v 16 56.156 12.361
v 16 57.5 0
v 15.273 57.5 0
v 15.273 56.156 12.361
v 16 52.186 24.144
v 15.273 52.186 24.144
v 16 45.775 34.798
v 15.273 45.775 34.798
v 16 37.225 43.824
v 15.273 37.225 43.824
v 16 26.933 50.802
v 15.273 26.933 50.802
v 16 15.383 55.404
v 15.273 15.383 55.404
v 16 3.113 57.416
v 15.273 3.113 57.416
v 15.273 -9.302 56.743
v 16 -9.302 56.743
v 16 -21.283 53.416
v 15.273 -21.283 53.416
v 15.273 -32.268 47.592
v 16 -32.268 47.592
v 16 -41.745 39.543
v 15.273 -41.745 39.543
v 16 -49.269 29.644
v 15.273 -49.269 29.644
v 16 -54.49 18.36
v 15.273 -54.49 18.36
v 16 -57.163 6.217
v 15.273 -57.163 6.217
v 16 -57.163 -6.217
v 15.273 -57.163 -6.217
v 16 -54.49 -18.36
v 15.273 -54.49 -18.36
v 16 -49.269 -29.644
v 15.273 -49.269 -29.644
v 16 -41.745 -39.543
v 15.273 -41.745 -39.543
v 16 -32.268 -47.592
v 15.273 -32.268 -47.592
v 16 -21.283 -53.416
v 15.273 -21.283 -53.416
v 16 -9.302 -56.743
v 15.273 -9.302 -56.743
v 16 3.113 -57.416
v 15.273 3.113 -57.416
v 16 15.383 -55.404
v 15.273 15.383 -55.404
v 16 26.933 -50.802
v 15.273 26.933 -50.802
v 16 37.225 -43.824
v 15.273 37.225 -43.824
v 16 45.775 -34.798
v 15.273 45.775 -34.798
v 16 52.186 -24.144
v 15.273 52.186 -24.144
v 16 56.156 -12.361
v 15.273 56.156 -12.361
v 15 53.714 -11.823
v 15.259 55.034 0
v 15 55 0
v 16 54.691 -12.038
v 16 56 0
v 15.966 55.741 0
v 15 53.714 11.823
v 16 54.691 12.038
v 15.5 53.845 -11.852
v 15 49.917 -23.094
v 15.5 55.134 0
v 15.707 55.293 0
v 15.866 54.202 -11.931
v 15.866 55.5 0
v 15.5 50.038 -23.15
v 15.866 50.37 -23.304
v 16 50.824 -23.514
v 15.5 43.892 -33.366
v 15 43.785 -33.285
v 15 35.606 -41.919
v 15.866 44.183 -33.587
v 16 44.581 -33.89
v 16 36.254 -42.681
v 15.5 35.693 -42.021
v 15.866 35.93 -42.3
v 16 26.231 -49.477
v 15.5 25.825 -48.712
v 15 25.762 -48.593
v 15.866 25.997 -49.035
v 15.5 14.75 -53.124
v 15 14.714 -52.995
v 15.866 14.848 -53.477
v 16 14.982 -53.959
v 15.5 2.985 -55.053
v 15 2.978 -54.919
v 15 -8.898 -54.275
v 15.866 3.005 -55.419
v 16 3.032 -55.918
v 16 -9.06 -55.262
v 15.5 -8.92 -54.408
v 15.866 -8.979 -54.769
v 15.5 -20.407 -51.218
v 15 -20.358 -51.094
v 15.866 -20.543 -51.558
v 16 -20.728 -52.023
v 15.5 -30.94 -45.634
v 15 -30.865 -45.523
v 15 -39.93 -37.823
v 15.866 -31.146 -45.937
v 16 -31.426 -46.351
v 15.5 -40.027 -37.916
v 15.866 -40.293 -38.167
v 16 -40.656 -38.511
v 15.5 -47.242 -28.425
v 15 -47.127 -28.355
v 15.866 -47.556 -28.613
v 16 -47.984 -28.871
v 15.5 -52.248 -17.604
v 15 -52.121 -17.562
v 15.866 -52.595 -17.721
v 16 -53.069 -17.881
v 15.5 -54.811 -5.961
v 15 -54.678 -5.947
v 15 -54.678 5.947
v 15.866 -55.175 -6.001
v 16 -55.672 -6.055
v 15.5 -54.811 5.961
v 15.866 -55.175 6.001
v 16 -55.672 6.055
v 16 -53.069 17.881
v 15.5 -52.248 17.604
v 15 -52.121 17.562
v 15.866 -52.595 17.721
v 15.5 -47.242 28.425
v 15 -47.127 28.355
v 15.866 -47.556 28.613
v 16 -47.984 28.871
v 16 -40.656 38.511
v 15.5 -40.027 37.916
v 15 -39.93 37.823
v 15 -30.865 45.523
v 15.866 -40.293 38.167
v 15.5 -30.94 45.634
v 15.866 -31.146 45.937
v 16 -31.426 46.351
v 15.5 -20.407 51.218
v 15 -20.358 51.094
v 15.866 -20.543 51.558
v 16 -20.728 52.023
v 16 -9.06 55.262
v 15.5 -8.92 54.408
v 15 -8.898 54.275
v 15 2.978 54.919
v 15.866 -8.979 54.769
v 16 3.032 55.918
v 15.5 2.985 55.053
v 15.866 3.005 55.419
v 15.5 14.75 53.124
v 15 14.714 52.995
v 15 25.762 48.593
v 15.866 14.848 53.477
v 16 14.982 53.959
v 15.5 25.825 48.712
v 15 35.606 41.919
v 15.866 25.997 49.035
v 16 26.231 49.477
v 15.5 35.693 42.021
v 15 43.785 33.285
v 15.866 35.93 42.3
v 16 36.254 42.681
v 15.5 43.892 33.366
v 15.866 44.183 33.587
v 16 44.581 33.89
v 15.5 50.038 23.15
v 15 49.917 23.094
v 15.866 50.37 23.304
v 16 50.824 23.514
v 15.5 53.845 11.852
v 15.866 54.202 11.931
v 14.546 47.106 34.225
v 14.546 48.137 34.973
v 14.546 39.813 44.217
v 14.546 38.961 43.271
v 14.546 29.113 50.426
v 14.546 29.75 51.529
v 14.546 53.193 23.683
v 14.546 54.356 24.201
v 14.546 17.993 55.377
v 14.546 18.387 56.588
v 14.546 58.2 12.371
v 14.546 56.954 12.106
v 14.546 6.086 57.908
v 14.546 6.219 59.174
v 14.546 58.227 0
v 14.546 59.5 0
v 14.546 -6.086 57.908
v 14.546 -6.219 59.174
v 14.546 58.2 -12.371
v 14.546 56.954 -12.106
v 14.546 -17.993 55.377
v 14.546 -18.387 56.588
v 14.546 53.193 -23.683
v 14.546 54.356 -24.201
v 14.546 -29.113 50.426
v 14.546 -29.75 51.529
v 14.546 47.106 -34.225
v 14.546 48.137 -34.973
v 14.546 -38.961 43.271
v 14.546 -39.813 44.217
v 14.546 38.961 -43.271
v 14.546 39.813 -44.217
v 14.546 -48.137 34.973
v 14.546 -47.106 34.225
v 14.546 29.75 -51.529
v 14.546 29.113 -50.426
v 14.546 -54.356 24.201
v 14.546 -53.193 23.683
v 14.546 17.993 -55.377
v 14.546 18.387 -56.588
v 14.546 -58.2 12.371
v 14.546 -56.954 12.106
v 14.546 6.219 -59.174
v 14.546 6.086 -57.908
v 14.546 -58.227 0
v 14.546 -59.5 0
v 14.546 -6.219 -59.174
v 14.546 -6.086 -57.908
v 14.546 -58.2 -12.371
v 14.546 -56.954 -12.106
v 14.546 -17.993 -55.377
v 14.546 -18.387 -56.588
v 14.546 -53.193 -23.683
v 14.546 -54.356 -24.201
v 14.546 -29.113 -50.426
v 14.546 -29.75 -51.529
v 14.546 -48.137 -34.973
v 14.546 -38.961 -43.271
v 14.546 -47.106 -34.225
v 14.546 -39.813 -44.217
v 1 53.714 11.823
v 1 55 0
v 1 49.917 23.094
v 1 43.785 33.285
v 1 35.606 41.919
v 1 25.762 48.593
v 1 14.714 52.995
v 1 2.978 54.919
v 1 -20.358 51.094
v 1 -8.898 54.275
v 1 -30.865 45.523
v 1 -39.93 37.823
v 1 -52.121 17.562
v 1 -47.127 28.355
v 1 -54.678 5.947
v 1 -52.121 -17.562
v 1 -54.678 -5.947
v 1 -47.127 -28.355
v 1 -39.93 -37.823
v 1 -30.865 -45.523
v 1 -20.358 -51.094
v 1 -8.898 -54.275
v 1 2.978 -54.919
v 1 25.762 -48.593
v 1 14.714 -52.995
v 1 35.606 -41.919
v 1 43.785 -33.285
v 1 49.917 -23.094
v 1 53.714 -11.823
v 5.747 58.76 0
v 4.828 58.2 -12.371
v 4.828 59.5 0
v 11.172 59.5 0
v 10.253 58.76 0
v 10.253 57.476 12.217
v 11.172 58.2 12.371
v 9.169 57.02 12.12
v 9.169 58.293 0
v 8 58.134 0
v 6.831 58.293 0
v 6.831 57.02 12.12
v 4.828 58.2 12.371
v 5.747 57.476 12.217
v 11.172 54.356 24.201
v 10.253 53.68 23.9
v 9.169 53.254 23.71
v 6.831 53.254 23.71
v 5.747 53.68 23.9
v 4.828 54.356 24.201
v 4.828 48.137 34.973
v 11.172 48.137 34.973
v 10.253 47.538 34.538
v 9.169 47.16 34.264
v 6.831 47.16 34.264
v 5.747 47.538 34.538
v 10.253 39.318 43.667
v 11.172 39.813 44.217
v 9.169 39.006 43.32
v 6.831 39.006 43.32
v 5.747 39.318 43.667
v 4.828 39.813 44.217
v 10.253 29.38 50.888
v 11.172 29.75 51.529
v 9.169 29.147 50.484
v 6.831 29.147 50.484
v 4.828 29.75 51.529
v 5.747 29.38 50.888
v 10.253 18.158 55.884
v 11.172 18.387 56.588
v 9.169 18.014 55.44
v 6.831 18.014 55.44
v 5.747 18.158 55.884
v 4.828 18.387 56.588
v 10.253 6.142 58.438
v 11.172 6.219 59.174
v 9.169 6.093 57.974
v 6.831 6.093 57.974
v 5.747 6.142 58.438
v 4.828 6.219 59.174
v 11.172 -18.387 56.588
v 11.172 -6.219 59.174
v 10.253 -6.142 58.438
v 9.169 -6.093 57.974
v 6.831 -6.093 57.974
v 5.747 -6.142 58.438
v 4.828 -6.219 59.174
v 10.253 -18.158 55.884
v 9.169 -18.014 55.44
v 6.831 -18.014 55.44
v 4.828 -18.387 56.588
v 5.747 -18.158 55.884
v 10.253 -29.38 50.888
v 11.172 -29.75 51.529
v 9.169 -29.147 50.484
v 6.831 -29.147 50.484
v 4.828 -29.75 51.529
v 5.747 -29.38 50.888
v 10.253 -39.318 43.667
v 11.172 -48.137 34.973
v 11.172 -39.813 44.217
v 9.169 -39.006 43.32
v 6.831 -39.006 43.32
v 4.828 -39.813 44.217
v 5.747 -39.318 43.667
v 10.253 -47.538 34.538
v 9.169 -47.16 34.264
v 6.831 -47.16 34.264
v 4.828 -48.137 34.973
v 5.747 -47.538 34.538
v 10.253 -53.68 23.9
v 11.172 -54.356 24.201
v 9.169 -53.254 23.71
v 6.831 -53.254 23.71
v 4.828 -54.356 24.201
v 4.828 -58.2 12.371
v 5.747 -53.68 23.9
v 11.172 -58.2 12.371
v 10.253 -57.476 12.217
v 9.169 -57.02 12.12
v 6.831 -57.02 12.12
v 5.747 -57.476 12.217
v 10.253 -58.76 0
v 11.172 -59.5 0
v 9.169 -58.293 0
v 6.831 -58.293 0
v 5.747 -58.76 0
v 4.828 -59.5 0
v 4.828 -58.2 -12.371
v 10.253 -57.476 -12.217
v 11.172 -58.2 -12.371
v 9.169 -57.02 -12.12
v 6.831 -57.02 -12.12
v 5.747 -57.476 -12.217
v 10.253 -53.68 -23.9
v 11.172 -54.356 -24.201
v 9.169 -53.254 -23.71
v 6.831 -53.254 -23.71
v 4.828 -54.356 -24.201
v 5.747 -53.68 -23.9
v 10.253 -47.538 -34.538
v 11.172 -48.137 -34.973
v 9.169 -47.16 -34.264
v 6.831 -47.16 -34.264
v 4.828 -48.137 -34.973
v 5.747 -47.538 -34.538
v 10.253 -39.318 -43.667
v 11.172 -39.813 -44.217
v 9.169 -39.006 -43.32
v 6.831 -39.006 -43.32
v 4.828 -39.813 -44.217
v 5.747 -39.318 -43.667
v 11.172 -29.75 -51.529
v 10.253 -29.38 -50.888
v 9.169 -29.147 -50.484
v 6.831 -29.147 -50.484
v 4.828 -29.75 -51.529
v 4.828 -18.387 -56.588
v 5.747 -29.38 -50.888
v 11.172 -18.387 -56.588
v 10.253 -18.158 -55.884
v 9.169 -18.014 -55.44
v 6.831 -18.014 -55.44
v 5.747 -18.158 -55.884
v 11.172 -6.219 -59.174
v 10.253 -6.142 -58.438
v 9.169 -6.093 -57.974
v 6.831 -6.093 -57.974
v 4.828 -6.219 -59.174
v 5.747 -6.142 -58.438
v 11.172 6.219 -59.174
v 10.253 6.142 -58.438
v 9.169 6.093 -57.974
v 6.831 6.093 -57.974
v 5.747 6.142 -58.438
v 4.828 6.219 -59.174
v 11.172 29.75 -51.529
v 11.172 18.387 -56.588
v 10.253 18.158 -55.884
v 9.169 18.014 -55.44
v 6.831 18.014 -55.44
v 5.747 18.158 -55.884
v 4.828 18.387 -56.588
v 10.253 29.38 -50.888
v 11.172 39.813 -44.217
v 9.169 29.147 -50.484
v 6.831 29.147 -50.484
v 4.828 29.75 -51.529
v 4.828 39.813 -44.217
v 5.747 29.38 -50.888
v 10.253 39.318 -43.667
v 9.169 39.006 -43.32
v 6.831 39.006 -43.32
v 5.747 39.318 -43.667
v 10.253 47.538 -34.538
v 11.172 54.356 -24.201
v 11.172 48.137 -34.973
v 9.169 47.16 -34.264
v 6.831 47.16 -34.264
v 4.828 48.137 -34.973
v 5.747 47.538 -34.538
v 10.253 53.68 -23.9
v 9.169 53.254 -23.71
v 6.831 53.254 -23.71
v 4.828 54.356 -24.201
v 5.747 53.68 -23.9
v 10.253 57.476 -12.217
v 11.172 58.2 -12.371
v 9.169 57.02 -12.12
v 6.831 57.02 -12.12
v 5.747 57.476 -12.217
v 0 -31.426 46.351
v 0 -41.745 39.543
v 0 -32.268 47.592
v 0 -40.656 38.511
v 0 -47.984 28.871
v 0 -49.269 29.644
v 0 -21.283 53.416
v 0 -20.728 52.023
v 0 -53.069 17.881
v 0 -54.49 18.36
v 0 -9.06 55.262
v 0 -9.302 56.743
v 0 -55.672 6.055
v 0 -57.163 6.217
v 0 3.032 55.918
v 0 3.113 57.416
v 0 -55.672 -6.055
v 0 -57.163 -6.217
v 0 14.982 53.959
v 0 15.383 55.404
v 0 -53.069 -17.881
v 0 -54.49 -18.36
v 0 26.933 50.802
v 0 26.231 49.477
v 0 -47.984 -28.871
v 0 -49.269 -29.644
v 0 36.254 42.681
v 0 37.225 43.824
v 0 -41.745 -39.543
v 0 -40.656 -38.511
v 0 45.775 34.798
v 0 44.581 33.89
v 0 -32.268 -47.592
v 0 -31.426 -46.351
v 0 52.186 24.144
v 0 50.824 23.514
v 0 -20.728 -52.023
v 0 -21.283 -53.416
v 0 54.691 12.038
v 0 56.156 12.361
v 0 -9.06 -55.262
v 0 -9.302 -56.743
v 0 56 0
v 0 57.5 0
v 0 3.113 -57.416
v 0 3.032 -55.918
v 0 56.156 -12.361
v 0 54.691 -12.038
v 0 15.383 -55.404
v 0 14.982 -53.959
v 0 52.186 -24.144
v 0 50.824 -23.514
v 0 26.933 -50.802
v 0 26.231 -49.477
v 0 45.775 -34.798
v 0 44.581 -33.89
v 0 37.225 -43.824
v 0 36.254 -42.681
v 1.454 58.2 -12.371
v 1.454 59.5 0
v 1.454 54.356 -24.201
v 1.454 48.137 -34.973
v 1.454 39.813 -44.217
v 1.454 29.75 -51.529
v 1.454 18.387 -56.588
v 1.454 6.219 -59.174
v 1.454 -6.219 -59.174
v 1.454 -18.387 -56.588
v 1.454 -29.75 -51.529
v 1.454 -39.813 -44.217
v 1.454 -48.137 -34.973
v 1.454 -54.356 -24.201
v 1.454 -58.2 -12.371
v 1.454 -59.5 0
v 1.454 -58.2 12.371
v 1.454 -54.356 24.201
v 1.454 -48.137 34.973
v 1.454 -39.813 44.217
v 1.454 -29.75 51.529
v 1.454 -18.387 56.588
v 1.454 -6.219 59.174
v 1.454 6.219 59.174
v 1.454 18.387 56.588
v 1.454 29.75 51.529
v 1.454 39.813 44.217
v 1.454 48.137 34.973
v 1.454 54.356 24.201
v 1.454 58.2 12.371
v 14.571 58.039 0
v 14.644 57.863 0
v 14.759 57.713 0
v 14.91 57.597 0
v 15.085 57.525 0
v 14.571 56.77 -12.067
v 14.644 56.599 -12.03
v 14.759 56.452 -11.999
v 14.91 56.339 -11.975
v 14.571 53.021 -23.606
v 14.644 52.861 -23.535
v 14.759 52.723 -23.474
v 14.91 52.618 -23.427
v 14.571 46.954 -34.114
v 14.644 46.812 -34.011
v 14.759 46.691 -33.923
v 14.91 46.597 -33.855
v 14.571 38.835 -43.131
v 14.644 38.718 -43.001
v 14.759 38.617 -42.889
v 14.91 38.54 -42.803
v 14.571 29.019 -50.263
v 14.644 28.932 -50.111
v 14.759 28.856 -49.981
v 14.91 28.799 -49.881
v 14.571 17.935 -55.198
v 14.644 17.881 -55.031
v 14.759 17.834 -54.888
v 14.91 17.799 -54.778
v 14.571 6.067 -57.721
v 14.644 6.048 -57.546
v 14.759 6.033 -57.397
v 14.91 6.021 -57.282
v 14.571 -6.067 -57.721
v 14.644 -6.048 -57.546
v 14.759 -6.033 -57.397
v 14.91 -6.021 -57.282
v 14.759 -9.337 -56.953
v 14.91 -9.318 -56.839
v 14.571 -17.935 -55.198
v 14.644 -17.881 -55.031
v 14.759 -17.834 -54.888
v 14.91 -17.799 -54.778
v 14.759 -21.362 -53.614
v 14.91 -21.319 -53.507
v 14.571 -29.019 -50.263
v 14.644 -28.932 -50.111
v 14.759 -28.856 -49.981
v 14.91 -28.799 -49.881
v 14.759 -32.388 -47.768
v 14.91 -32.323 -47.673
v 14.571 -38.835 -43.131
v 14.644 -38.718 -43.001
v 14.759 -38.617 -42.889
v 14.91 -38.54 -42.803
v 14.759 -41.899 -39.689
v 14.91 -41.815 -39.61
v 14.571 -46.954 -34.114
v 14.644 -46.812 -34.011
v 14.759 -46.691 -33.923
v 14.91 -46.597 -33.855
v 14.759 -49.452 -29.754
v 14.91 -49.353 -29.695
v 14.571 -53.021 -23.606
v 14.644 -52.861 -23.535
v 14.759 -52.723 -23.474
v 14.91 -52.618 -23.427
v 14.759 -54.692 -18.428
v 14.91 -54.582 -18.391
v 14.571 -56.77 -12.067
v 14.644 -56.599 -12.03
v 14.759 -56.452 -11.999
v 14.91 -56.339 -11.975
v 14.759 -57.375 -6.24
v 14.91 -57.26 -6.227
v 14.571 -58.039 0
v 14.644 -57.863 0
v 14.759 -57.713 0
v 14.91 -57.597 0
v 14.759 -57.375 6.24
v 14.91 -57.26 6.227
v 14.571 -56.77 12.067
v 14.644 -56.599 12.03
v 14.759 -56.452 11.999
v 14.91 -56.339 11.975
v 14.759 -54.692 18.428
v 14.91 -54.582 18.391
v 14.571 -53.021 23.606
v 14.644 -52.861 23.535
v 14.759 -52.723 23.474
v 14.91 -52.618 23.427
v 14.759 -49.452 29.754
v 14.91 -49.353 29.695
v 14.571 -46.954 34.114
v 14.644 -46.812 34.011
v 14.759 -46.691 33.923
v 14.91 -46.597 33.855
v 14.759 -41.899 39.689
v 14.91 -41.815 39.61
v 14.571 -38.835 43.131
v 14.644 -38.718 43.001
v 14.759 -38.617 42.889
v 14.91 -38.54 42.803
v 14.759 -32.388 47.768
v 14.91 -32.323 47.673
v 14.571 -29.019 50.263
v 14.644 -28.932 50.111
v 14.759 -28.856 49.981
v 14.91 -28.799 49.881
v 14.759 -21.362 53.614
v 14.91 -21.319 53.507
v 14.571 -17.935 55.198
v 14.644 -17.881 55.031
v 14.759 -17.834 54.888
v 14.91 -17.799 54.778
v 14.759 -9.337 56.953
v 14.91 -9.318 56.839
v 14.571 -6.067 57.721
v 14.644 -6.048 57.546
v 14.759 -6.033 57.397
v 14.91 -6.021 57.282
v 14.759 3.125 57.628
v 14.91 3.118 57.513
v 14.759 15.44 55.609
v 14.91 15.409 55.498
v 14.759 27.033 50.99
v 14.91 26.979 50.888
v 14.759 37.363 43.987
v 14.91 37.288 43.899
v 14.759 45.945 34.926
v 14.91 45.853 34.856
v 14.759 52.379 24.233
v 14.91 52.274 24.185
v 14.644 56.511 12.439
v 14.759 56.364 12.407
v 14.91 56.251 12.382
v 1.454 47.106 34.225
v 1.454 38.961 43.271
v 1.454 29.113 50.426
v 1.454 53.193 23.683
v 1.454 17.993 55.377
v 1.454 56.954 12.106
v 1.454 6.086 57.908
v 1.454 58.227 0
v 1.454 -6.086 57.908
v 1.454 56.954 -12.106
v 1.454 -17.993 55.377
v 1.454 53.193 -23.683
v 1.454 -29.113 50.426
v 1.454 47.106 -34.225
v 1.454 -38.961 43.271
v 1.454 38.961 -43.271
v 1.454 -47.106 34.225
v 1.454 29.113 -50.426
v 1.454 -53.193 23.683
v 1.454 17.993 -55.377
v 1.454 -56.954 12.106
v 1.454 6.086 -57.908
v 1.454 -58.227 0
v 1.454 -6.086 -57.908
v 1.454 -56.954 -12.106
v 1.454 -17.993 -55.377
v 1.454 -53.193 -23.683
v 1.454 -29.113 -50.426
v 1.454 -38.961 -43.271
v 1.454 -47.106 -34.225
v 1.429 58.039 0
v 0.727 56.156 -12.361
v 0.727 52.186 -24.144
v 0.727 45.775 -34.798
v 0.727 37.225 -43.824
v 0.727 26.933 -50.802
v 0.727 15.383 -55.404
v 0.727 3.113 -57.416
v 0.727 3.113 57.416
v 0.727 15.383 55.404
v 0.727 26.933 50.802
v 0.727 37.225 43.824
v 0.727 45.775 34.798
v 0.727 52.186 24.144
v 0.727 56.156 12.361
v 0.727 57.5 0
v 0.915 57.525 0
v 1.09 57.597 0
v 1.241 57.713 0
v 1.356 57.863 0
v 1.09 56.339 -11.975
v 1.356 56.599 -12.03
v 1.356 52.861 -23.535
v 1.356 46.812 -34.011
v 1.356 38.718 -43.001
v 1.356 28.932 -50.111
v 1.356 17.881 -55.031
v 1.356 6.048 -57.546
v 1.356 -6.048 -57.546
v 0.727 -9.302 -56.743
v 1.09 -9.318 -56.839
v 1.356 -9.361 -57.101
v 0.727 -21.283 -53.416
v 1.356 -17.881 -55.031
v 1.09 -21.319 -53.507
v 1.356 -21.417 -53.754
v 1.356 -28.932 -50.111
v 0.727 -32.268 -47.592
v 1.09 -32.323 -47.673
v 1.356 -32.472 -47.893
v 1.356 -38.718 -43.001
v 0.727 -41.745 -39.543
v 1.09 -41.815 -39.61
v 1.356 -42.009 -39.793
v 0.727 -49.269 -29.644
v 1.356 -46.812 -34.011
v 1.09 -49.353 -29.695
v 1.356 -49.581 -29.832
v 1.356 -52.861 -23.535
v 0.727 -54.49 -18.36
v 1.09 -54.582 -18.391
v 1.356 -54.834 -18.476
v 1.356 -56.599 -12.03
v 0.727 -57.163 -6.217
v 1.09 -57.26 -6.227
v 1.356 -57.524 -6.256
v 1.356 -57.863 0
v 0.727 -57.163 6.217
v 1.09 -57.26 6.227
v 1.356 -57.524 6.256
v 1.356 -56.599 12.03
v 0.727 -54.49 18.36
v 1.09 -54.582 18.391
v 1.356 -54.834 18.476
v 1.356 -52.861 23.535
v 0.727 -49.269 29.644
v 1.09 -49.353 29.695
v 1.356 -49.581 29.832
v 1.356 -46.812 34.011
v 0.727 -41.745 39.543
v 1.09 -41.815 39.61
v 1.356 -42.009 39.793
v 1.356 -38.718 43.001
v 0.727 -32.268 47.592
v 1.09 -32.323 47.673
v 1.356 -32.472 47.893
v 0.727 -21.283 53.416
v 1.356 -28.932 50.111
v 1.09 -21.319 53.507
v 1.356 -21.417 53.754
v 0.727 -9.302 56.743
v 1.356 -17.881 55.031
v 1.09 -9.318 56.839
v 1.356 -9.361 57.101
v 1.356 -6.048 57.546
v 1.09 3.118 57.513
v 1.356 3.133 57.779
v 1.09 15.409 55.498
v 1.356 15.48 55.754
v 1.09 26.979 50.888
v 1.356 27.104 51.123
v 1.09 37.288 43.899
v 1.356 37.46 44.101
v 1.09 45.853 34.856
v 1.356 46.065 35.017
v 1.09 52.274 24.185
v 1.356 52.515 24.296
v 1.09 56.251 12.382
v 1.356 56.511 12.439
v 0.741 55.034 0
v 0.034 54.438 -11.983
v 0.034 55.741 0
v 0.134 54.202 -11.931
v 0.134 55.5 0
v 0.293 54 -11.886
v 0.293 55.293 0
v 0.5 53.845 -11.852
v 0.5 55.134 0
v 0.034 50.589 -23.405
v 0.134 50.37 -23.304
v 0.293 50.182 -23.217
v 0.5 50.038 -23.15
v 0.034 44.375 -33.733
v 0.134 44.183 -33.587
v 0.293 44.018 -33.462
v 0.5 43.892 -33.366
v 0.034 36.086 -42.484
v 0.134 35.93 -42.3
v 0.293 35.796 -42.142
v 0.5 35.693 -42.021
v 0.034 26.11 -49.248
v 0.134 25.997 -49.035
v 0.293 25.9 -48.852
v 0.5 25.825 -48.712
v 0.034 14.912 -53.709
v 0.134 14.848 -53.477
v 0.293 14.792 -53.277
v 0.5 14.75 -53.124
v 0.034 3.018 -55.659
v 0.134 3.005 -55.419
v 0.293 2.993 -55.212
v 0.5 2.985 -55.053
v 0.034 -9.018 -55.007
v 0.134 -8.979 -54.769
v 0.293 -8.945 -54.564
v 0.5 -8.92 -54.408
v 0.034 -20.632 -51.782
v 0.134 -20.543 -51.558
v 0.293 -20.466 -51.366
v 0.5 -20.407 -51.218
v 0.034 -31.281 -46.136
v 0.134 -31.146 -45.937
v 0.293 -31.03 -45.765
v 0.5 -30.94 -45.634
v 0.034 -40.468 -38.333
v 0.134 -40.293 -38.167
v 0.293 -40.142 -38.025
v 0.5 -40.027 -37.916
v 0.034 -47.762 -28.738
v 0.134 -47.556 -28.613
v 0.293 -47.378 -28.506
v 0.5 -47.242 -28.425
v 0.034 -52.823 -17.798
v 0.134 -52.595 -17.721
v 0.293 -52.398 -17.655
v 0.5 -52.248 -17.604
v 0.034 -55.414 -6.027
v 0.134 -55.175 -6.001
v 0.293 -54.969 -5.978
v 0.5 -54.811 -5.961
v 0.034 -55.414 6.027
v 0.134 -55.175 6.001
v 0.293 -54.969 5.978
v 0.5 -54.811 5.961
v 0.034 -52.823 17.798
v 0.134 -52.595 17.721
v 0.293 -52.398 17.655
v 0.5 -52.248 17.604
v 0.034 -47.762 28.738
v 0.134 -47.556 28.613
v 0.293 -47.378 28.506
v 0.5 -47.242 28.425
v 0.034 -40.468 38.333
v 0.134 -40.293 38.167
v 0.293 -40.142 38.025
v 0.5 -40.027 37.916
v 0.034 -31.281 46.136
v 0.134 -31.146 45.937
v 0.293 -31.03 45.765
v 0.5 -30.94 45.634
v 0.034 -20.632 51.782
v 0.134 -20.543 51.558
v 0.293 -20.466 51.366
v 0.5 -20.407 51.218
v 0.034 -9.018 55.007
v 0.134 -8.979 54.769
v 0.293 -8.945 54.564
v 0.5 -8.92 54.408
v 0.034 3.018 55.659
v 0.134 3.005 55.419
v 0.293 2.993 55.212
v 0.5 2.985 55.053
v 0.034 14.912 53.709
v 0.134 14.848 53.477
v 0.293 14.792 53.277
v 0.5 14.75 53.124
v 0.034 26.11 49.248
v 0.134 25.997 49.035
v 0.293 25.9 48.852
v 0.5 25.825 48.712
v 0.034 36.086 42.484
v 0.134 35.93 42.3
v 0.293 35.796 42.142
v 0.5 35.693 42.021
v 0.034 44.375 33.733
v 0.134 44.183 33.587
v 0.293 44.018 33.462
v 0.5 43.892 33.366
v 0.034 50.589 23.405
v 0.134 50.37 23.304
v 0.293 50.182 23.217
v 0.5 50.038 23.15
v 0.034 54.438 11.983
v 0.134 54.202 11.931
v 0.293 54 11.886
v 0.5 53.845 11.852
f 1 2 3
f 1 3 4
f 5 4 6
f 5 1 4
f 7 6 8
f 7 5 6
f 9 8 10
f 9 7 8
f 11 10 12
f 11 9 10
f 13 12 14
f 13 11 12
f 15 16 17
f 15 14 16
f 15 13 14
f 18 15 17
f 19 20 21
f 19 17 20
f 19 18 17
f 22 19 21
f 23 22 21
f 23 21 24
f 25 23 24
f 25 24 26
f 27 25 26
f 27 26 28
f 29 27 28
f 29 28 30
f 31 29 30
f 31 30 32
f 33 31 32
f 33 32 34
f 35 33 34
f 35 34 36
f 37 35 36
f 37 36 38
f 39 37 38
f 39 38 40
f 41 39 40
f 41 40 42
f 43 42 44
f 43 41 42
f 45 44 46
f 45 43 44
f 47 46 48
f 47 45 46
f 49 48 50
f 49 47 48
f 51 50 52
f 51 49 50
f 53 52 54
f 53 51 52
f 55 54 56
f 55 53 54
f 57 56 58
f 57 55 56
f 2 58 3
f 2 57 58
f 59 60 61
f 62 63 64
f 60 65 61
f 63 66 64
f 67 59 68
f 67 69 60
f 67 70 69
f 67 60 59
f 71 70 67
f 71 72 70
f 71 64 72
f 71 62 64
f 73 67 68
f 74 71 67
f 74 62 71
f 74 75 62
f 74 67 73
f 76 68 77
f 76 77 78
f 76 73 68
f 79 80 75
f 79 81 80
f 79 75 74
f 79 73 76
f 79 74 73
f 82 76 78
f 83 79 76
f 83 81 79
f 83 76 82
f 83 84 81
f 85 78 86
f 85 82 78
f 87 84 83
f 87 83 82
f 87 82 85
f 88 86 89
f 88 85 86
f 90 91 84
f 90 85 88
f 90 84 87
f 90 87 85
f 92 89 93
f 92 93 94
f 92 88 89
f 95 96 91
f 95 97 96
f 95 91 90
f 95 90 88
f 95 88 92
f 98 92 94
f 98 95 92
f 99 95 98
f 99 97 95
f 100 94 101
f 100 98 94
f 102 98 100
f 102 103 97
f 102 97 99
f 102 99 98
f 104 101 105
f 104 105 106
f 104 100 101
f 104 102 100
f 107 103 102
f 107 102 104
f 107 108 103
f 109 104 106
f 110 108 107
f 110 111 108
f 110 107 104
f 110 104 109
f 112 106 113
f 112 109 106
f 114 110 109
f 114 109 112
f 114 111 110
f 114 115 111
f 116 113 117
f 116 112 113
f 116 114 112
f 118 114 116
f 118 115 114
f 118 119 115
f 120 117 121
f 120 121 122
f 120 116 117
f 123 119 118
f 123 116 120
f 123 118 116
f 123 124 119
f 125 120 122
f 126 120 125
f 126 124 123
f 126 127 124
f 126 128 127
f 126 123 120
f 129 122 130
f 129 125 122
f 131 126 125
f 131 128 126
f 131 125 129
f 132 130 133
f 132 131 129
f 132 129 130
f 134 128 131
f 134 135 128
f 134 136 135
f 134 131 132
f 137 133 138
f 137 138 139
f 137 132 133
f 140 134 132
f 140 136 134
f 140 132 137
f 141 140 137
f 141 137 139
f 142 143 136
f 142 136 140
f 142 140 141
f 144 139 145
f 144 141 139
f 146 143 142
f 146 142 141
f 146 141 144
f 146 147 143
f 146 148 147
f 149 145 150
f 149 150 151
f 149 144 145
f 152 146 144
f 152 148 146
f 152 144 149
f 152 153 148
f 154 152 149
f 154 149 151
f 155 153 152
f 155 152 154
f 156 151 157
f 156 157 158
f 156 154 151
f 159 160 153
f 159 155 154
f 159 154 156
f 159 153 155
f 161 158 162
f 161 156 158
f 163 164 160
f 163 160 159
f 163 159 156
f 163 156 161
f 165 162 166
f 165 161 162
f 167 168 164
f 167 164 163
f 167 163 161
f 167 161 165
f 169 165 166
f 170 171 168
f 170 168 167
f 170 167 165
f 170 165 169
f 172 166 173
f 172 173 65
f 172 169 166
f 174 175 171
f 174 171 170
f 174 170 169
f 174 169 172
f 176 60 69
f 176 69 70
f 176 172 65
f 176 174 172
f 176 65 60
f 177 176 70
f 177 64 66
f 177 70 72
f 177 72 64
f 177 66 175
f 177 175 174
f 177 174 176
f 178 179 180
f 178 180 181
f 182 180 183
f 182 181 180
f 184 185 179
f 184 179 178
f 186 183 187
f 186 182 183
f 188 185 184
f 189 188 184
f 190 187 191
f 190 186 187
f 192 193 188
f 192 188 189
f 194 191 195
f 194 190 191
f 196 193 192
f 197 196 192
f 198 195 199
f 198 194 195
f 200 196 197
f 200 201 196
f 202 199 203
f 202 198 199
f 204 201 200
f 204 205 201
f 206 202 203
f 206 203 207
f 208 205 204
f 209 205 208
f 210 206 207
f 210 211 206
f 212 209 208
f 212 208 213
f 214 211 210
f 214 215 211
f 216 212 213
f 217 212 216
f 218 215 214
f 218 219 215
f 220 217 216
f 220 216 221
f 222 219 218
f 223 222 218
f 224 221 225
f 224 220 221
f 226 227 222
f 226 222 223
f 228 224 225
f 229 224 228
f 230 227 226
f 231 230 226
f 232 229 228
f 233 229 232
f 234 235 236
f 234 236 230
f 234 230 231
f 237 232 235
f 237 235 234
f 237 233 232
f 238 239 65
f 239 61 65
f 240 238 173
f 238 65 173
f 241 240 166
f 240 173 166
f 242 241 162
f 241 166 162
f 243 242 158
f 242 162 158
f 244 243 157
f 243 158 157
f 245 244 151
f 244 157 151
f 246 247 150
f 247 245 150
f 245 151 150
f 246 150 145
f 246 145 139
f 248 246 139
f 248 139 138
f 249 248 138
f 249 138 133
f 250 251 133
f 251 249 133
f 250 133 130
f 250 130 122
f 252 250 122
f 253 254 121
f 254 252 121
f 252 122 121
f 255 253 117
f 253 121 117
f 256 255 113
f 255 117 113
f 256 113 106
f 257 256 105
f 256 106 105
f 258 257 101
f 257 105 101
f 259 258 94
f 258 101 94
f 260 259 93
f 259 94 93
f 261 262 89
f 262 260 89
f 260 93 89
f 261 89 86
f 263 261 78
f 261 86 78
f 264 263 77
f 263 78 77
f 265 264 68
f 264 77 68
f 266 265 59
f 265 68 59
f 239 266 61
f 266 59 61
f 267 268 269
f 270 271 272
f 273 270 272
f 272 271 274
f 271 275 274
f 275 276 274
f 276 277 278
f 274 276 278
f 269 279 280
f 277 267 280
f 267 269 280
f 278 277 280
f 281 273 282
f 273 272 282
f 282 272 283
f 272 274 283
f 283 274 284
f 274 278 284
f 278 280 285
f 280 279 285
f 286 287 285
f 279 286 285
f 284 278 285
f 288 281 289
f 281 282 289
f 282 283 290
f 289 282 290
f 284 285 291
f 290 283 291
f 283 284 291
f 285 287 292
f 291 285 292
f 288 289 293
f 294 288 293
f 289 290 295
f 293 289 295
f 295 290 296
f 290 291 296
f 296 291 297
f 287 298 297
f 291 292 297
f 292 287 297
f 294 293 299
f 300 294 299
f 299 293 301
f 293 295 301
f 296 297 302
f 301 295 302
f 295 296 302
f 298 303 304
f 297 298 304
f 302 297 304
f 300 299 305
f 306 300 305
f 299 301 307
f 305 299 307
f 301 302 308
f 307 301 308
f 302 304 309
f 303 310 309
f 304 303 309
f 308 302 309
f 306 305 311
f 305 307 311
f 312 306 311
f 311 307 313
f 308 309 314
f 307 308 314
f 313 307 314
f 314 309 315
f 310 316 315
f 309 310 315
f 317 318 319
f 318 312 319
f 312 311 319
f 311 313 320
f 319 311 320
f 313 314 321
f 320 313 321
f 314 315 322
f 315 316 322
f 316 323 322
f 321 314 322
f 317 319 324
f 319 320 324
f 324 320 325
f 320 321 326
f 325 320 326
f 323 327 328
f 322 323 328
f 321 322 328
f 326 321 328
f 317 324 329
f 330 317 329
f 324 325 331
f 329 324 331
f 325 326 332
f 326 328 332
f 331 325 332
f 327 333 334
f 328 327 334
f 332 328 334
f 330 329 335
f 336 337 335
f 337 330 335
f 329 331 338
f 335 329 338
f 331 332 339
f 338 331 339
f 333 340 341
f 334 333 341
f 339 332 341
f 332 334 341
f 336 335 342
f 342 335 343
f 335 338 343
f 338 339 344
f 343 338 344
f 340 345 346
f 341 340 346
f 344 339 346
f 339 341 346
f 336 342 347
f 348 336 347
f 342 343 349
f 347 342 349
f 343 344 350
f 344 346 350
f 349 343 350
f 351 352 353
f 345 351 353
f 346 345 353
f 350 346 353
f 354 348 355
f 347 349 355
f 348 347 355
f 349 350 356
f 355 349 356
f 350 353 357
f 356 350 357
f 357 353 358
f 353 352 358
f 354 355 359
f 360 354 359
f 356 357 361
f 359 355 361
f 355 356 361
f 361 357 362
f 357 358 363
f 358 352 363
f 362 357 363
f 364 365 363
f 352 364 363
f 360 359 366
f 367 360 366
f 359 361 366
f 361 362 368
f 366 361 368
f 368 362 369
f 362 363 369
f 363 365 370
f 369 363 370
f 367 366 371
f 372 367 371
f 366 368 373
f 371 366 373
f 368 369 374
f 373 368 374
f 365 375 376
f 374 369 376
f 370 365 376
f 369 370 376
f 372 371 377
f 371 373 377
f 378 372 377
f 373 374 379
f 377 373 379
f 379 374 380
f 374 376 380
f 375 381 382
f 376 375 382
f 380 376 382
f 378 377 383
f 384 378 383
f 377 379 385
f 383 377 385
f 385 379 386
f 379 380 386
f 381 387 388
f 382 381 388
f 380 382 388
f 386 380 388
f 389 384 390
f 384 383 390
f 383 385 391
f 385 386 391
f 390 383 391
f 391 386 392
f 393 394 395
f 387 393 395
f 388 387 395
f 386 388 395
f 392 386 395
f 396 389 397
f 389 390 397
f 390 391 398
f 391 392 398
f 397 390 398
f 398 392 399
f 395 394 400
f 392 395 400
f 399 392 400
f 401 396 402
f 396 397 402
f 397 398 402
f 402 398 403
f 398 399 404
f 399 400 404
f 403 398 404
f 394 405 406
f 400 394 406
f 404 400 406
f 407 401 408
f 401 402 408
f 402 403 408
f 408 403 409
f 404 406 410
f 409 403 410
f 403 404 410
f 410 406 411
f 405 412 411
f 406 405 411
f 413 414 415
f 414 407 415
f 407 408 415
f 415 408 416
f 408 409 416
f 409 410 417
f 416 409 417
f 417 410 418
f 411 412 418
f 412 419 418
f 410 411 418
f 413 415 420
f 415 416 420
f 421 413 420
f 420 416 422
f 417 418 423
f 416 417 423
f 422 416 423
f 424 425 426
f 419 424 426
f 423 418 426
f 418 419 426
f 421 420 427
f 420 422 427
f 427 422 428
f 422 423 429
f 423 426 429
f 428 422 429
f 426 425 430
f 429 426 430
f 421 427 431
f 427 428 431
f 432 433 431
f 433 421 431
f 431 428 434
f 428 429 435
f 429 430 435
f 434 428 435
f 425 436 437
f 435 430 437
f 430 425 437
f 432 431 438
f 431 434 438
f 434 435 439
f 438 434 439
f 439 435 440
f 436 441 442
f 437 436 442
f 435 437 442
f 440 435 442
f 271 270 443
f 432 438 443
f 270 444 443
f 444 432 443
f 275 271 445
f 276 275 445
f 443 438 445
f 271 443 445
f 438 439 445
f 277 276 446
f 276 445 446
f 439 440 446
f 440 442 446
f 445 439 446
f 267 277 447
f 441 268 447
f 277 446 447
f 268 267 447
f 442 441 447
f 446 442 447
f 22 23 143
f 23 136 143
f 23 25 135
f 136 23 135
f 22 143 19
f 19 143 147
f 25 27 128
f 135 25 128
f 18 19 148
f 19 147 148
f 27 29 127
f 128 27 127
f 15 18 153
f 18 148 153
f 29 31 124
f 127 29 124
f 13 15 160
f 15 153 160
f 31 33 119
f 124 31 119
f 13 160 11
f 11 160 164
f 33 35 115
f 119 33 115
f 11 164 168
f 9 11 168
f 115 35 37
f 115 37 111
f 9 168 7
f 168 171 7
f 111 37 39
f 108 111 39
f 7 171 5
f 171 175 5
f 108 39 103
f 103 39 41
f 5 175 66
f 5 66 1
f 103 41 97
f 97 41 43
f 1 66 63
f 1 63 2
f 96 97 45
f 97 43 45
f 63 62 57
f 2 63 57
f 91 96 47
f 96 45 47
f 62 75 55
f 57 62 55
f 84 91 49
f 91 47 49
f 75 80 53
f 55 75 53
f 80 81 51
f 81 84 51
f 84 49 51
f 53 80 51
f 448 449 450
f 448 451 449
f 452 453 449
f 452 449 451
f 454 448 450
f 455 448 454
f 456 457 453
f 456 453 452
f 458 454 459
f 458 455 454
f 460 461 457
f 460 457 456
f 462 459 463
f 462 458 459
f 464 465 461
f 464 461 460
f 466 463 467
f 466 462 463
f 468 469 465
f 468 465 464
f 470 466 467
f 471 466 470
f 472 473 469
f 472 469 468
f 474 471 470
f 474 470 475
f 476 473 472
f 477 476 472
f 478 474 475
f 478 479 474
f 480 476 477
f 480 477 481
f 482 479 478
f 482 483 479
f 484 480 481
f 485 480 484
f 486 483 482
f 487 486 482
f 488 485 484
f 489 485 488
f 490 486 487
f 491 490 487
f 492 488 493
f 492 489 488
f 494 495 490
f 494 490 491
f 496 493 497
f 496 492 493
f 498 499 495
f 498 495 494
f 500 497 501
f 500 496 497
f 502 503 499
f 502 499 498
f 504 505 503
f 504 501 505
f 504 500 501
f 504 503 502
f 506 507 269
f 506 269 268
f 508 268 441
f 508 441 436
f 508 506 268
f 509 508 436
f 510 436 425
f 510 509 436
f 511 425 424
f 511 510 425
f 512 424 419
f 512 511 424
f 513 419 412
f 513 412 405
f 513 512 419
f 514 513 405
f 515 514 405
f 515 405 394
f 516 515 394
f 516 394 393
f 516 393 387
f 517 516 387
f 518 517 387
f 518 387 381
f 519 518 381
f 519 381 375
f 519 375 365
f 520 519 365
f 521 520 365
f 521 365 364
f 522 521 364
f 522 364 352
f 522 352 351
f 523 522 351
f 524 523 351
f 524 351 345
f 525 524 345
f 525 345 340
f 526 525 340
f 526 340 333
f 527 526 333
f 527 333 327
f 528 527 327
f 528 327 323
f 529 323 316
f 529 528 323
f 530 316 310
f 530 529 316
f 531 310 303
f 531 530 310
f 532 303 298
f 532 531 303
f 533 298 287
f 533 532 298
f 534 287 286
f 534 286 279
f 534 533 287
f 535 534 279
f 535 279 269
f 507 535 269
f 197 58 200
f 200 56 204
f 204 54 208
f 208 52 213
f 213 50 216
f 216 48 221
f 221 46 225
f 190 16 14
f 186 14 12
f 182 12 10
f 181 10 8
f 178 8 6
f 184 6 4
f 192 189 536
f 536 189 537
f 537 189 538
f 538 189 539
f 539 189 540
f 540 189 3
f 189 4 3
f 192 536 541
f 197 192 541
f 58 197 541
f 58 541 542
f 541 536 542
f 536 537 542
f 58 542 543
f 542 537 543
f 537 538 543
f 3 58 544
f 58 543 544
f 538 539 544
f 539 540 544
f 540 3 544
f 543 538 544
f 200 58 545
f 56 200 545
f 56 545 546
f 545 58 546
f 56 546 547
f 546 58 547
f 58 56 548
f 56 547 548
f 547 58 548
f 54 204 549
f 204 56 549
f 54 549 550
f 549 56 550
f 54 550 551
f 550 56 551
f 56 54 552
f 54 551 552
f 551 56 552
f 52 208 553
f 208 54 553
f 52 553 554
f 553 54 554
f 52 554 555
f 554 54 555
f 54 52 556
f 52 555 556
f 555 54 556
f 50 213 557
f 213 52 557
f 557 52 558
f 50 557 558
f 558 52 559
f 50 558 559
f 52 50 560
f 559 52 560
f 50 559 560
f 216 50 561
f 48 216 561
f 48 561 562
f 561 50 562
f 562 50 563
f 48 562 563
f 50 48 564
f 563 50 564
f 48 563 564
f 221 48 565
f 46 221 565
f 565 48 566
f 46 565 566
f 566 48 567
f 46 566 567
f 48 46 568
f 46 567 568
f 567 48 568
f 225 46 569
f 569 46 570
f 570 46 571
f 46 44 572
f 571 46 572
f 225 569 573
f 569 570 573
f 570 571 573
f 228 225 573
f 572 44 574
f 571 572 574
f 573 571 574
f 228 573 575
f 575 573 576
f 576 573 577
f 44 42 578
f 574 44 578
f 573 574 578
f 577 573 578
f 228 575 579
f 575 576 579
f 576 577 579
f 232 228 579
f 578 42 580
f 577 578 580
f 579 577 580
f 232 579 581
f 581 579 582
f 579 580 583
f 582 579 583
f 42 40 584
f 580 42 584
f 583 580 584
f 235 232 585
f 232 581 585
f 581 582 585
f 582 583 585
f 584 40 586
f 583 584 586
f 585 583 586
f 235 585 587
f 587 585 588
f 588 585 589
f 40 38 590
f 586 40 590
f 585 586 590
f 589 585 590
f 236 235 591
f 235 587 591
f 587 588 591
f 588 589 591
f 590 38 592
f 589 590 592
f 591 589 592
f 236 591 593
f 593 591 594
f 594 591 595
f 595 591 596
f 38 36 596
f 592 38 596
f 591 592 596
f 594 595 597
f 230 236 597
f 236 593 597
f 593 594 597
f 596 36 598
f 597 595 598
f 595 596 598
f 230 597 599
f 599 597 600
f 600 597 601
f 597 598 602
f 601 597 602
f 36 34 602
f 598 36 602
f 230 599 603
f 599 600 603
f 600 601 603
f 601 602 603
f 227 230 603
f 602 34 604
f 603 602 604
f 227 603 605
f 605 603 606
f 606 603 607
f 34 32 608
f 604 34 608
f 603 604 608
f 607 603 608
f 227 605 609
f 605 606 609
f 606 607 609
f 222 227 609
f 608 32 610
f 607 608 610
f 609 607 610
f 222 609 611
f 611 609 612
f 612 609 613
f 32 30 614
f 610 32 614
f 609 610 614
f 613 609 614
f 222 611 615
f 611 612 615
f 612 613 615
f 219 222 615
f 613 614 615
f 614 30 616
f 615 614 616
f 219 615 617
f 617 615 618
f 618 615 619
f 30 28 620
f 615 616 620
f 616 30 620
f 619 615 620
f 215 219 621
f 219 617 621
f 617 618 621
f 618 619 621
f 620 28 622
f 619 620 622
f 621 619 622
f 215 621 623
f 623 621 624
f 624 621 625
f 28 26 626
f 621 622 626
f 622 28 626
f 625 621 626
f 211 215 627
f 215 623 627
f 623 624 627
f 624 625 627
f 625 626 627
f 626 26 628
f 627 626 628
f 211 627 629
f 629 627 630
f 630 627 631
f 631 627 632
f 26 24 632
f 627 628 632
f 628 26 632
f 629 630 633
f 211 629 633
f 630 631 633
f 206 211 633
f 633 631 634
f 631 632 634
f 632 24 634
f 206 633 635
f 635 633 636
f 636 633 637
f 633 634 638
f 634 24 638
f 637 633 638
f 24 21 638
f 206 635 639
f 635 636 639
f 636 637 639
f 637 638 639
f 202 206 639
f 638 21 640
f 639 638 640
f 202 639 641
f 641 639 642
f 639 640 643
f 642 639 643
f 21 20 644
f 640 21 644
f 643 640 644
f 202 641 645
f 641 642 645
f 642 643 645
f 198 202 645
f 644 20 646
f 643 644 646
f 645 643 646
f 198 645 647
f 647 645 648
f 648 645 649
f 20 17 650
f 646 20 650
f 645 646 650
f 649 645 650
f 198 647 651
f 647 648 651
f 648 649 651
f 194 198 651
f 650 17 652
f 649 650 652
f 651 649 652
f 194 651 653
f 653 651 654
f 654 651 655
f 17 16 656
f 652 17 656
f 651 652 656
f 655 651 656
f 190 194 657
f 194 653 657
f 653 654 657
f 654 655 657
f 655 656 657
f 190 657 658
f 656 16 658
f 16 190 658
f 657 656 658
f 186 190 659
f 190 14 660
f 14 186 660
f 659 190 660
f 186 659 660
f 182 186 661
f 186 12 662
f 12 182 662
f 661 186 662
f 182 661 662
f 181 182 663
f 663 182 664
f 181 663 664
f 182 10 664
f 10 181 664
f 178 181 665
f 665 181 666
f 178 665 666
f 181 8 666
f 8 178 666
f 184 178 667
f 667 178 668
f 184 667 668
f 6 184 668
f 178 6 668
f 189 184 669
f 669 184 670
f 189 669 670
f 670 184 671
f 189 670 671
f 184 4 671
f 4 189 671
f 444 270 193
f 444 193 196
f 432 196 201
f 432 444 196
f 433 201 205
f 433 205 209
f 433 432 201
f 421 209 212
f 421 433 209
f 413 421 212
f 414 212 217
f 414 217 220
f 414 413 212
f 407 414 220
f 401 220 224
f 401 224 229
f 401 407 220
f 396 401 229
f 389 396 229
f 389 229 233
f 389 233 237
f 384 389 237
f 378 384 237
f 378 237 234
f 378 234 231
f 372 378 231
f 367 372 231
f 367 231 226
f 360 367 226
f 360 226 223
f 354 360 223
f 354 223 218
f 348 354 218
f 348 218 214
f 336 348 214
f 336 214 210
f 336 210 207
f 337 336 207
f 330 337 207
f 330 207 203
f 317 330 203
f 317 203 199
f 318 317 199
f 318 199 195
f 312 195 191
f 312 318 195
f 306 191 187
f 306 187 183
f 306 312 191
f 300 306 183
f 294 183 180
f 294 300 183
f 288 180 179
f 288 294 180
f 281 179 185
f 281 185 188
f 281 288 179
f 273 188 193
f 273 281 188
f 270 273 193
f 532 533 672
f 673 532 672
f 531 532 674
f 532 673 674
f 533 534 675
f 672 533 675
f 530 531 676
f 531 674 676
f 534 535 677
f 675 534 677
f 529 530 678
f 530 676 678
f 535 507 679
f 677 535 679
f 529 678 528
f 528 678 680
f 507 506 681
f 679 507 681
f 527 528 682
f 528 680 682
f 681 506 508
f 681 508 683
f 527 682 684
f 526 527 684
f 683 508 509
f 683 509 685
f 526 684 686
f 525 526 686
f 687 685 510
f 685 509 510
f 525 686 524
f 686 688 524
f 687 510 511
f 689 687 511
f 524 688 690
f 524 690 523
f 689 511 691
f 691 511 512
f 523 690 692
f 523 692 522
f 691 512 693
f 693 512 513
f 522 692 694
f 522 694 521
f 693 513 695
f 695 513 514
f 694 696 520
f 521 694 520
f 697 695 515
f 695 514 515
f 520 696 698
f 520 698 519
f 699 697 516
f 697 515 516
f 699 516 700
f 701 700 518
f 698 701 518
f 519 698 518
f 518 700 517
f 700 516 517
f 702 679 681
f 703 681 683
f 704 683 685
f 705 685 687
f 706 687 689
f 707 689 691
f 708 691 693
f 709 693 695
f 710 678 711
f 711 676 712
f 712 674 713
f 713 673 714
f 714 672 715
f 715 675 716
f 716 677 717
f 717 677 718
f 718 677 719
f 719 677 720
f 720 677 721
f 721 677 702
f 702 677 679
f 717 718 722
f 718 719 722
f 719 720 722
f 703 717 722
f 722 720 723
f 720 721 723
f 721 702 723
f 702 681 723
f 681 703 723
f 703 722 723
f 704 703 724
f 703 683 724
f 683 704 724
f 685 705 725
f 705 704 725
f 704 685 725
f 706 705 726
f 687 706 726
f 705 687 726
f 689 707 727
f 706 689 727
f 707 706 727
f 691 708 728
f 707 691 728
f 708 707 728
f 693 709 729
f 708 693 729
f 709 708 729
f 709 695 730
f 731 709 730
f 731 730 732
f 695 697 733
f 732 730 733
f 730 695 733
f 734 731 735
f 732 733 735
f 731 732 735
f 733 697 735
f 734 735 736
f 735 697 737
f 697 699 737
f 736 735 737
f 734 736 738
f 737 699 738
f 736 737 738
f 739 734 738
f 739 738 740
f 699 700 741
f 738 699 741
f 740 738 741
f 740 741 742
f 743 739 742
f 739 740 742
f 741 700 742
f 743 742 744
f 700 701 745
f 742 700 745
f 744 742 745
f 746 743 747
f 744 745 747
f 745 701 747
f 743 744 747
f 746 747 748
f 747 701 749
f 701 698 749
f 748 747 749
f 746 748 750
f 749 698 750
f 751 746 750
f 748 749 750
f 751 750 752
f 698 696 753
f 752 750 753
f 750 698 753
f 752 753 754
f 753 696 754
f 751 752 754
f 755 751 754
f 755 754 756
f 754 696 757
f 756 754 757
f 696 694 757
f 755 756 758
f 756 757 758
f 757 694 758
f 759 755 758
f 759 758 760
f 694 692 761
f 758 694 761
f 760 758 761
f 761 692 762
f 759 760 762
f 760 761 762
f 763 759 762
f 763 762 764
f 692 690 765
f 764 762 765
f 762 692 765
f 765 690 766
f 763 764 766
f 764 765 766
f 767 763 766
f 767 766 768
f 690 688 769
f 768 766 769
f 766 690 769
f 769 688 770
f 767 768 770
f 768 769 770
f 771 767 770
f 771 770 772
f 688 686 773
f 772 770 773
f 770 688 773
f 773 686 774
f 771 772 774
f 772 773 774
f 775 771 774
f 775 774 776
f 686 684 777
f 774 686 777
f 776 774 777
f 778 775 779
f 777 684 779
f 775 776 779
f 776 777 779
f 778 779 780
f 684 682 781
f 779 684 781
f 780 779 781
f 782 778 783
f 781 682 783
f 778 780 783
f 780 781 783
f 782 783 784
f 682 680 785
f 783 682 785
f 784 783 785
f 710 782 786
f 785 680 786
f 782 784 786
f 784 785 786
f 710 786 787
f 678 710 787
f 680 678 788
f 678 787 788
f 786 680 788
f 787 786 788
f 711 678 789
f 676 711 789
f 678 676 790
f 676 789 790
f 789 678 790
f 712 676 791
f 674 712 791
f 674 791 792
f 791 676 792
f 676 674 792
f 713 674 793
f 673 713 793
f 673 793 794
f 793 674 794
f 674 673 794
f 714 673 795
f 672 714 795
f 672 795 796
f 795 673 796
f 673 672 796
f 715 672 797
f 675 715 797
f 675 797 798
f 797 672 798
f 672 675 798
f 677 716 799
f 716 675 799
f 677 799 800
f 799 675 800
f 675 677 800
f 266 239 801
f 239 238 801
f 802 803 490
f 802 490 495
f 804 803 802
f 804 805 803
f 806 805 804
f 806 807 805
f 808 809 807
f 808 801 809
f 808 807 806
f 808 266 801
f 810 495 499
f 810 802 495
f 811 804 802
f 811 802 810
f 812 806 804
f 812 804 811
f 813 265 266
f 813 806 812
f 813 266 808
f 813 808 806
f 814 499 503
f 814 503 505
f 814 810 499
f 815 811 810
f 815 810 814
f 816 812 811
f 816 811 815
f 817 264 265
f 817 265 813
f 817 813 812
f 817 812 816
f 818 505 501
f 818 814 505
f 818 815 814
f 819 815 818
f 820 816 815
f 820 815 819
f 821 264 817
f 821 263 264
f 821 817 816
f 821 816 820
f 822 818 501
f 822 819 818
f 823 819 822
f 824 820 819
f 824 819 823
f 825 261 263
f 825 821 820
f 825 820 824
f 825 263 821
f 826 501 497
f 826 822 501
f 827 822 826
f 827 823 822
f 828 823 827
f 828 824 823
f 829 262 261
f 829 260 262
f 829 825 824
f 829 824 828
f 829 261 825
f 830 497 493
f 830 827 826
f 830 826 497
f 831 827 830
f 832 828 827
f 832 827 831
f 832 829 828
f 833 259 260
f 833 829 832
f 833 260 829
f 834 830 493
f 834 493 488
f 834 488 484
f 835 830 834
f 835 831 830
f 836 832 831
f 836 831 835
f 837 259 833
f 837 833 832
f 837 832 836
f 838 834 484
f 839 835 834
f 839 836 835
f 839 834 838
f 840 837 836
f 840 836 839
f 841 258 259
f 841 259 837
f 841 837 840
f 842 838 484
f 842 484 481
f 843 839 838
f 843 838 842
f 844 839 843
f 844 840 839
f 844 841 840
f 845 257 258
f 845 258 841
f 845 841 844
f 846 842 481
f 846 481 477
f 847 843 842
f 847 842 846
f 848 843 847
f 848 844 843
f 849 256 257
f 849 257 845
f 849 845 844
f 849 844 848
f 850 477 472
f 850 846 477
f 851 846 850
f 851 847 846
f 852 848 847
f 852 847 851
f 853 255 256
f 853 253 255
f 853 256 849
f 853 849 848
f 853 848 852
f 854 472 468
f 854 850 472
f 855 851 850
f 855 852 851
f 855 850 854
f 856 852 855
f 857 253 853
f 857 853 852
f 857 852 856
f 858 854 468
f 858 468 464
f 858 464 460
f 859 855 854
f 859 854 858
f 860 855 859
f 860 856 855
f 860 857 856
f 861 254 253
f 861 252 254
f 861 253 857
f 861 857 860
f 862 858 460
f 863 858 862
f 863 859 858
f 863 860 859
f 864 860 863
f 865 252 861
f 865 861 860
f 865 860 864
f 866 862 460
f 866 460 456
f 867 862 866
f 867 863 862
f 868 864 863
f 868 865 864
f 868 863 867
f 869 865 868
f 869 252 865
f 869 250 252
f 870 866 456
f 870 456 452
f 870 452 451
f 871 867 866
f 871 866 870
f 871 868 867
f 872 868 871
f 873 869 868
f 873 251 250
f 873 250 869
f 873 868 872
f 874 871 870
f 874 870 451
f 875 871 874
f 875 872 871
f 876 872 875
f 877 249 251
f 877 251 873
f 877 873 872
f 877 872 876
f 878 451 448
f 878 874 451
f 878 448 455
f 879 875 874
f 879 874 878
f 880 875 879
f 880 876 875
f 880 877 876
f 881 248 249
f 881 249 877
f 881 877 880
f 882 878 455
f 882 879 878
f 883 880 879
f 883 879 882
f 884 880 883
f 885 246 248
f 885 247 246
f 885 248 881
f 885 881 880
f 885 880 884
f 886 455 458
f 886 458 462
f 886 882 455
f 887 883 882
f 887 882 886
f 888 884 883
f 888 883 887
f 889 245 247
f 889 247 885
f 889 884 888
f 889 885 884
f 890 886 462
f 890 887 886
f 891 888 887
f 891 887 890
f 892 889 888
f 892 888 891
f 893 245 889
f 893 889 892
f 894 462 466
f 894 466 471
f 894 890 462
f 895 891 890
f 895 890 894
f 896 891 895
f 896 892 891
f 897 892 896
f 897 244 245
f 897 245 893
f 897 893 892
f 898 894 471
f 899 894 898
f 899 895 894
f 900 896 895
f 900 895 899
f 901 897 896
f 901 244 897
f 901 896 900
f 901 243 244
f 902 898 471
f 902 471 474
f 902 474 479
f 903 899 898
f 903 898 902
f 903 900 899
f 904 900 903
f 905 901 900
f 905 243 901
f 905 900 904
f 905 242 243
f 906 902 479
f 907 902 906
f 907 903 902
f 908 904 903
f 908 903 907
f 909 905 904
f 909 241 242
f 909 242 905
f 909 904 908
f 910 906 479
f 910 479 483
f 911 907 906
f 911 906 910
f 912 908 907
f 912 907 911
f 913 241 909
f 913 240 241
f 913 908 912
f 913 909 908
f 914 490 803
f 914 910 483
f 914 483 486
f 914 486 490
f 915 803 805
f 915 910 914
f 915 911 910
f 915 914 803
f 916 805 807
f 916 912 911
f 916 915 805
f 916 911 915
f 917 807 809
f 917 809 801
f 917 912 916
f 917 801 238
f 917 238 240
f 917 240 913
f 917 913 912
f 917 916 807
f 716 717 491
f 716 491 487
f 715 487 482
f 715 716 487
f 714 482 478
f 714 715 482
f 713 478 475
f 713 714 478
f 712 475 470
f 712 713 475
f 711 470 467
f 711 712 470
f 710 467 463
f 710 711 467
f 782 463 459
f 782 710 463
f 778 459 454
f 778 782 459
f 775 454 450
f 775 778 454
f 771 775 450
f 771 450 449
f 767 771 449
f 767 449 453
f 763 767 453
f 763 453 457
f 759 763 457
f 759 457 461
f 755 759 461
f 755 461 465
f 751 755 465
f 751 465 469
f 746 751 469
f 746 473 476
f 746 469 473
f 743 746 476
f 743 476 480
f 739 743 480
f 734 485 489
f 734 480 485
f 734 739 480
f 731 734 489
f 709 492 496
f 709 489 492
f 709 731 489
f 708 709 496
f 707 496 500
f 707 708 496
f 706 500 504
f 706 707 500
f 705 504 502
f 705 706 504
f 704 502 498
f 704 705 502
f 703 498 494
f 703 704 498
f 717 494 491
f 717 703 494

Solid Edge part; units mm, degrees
sketch "Sketch1" plane through (0, 0, 0) normal (0, 0, 1) x (1, 0, 0)
  arc A0 (0, 56) -> (1, 55) centre (1, 56) ccw
  line L0 (1, 55) -> (15, 55)
  arc A1 (15, 55) -> (16, 56) centre (15, 56) ccw
  line L1 (16, 56) -> (16, 59.167)
  arc A2 (16, 59.167) -> (15.667, 59.5) centre (15.667, 59.167) ccw
  line L2 (15.667, 59.5) -> (11.1721, 59.5)
  arc A3 (11.1721, 59.5) -> (4.8279, 59.5) centre (8, 62.5) cw
  line L3 (4.8279, 59.5) -> (0.333, 59.5)
  arc A4 (0.333, 59.5) -> (0, 59.167) centre (0.333, 59.167) ccw
  line L4 (0, 59.167) -> (0, 56)
revolve "RevolvedProtrusion1" add sketch "Sketch1" angle 360 about axis through (15, 0, 0) along (-1, 0, 0)
sketch "Sketch2" plane through (0, 0, 0) normal (0, 0, 1) x (1, 0, 0)
  line L0 (0, 57.5) -> (0.7268, 57.5)
  arc A0 (0.7268, 57.5) -> (1.4536, 58.2268) centre (0.7268, 58.2268) ccw
  line L1 (1.4536, 58.2268) -> (1.4536, 61.5)
  line L2 (1.4536, 61.5) -> (14.5464, 61.5)
  line L3 (14.5464, 61.5) -> (14.5464, 58.2268)
  arc A1 (14.5464, 58.2268) -> (15.2732, 57.5) centre (15.2732, 58.2268) ccw
  line L4 (15.2732, 57.5) -> (16, 57.5)
  line L5 (16, 57.5) -> (16, 63.5)
  line L6 (16, 63.5) -> (0, 63.5)
  line L7 (0, 63.5) -> (0, 57.5)
revolve "RevolvedCutout1" cut sketch "Sketch2" angle 360 about axis through (16, 0, 0) along (-1, 0, 0)
